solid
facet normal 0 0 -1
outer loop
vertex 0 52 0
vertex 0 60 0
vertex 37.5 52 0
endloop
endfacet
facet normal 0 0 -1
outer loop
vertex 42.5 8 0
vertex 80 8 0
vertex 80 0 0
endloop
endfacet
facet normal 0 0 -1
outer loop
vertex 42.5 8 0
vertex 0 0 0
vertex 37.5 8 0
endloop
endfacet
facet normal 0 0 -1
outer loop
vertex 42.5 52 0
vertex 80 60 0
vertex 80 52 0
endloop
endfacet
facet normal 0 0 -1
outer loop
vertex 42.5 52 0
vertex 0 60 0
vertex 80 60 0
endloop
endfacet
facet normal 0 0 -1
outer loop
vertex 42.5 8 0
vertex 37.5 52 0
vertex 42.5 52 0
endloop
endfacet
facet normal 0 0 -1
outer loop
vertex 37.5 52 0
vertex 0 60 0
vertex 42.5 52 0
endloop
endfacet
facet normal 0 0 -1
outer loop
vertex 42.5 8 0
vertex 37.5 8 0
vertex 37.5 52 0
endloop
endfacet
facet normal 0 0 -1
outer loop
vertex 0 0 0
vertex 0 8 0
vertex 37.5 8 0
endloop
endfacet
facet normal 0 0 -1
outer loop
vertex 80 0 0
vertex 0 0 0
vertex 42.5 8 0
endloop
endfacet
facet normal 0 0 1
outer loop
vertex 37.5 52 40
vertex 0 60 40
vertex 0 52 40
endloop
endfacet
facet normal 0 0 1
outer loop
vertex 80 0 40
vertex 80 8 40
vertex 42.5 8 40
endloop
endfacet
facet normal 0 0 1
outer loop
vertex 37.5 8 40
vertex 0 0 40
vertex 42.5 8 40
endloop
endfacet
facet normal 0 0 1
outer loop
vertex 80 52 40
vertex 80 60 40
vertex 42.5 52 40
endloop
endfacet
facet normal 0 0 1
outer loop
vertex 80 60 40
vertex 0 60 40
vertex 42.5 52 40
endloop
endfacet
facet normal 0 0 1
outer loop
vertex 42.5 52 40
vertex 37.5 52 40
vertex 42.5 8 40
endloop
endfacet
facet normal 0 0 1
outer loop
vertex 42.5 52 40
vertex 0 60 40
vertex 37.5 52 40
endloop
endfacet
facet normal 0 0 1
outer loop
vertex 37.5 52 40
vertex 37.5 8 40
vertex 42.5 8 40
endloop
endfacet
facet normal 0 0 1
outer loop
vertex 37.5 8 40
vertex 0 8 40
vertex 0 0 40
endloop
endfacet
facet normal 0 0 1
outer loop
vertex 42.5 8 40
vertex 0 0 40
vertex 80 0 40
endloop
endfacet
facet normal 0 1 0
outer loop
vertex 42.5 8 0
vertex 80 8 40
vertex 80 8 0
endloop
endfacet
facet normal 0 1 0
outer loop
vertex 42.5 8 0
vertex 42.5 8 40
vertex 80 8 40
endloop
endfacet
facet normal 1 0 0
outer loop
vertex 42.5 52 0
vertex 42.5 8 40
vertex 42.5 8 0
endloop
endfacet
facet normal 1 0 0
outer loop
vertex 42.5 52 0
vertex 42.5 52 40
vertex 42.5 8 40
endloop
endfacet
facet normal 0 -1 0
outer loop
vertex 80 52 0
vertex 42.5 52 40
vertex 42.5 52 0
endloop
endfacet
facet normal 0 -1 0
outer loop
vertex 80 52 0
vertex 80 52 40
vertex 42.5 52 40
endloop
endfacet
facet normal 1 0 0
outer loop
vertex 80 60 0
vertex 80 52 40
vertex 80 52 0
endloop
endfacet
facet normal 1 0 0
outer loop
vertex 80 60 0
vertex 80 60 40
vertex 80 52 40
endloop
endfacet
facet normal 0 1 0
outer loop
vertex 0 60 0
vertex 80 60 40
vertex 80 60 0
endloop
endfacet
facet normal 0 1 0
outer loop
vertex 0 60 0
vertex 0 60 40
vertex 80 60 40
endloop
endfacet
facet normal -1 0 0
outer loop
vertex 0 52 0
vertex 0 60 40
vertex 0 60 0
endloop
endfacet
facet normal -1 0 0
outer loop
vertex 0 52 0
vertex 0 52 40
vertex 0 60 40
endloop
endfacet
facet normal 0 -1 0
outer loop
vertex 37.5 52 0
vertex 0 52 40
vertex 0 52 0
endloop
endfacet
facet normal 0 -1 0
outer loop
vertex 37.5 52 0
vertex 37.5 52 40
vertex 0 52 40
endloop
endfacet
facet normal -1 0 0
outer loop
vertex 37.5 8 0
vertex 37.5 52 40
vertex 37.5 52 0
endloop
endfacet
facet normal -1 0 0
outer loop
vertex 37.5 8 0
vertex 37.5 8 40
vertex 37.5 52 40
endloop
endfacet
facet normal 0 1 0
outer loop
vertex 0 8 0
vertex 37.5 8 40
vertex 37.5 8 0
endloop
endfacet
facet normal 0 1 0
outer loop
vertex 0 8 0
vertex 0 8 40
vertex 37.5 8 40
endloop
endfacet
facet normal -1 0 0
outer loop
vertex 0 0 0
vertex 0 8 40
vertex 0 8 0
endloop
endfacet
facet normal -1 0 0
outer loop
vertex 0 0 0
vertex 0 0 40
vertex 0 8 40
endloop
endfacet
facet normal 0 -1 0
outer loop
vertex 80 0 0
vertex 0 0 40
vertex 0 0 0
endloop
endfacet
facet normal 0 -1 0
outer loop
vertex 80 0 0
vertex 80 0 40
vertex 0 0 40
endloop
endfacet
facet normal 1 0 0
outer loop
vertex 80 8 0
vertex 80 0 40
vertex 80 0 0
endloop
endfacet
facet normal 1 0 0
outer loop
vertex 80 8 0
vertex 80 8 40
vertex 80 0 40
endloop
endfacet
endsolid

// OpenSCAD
$fn = 32;

// ----------------------------------------------------------------------
// Structural section: ibeam 80 x 60 mm
// ----------------------------------------------------------------------

// --- parameters (mm) ---
sec_w = 80;               // section width, X
sec_h = 60;               // section height, Y
flange_t = 8;             // flange thickness
web_t = 5;                // web thickness
plate_t = 40;             // cut length, Z (extrusion height)
fit_tol = 0.02;           // declared fit tolerance (prompt contract)
free_tol = 0.2;           // declared free tolerance (prompt contract)

profile = [[0, 0], [80, 0], [80, 8], [42.5, 8], [42.5, 52], [80, 52], [80, 60], [0, 60], [0, 52], [37.5, 52], [37.5, 8], [0, 8]];  // primary outline, 12 points, counter clockwise

// --- the one profile operation ---
linear_extrude(height = plate_t) polygon(points = profile);
